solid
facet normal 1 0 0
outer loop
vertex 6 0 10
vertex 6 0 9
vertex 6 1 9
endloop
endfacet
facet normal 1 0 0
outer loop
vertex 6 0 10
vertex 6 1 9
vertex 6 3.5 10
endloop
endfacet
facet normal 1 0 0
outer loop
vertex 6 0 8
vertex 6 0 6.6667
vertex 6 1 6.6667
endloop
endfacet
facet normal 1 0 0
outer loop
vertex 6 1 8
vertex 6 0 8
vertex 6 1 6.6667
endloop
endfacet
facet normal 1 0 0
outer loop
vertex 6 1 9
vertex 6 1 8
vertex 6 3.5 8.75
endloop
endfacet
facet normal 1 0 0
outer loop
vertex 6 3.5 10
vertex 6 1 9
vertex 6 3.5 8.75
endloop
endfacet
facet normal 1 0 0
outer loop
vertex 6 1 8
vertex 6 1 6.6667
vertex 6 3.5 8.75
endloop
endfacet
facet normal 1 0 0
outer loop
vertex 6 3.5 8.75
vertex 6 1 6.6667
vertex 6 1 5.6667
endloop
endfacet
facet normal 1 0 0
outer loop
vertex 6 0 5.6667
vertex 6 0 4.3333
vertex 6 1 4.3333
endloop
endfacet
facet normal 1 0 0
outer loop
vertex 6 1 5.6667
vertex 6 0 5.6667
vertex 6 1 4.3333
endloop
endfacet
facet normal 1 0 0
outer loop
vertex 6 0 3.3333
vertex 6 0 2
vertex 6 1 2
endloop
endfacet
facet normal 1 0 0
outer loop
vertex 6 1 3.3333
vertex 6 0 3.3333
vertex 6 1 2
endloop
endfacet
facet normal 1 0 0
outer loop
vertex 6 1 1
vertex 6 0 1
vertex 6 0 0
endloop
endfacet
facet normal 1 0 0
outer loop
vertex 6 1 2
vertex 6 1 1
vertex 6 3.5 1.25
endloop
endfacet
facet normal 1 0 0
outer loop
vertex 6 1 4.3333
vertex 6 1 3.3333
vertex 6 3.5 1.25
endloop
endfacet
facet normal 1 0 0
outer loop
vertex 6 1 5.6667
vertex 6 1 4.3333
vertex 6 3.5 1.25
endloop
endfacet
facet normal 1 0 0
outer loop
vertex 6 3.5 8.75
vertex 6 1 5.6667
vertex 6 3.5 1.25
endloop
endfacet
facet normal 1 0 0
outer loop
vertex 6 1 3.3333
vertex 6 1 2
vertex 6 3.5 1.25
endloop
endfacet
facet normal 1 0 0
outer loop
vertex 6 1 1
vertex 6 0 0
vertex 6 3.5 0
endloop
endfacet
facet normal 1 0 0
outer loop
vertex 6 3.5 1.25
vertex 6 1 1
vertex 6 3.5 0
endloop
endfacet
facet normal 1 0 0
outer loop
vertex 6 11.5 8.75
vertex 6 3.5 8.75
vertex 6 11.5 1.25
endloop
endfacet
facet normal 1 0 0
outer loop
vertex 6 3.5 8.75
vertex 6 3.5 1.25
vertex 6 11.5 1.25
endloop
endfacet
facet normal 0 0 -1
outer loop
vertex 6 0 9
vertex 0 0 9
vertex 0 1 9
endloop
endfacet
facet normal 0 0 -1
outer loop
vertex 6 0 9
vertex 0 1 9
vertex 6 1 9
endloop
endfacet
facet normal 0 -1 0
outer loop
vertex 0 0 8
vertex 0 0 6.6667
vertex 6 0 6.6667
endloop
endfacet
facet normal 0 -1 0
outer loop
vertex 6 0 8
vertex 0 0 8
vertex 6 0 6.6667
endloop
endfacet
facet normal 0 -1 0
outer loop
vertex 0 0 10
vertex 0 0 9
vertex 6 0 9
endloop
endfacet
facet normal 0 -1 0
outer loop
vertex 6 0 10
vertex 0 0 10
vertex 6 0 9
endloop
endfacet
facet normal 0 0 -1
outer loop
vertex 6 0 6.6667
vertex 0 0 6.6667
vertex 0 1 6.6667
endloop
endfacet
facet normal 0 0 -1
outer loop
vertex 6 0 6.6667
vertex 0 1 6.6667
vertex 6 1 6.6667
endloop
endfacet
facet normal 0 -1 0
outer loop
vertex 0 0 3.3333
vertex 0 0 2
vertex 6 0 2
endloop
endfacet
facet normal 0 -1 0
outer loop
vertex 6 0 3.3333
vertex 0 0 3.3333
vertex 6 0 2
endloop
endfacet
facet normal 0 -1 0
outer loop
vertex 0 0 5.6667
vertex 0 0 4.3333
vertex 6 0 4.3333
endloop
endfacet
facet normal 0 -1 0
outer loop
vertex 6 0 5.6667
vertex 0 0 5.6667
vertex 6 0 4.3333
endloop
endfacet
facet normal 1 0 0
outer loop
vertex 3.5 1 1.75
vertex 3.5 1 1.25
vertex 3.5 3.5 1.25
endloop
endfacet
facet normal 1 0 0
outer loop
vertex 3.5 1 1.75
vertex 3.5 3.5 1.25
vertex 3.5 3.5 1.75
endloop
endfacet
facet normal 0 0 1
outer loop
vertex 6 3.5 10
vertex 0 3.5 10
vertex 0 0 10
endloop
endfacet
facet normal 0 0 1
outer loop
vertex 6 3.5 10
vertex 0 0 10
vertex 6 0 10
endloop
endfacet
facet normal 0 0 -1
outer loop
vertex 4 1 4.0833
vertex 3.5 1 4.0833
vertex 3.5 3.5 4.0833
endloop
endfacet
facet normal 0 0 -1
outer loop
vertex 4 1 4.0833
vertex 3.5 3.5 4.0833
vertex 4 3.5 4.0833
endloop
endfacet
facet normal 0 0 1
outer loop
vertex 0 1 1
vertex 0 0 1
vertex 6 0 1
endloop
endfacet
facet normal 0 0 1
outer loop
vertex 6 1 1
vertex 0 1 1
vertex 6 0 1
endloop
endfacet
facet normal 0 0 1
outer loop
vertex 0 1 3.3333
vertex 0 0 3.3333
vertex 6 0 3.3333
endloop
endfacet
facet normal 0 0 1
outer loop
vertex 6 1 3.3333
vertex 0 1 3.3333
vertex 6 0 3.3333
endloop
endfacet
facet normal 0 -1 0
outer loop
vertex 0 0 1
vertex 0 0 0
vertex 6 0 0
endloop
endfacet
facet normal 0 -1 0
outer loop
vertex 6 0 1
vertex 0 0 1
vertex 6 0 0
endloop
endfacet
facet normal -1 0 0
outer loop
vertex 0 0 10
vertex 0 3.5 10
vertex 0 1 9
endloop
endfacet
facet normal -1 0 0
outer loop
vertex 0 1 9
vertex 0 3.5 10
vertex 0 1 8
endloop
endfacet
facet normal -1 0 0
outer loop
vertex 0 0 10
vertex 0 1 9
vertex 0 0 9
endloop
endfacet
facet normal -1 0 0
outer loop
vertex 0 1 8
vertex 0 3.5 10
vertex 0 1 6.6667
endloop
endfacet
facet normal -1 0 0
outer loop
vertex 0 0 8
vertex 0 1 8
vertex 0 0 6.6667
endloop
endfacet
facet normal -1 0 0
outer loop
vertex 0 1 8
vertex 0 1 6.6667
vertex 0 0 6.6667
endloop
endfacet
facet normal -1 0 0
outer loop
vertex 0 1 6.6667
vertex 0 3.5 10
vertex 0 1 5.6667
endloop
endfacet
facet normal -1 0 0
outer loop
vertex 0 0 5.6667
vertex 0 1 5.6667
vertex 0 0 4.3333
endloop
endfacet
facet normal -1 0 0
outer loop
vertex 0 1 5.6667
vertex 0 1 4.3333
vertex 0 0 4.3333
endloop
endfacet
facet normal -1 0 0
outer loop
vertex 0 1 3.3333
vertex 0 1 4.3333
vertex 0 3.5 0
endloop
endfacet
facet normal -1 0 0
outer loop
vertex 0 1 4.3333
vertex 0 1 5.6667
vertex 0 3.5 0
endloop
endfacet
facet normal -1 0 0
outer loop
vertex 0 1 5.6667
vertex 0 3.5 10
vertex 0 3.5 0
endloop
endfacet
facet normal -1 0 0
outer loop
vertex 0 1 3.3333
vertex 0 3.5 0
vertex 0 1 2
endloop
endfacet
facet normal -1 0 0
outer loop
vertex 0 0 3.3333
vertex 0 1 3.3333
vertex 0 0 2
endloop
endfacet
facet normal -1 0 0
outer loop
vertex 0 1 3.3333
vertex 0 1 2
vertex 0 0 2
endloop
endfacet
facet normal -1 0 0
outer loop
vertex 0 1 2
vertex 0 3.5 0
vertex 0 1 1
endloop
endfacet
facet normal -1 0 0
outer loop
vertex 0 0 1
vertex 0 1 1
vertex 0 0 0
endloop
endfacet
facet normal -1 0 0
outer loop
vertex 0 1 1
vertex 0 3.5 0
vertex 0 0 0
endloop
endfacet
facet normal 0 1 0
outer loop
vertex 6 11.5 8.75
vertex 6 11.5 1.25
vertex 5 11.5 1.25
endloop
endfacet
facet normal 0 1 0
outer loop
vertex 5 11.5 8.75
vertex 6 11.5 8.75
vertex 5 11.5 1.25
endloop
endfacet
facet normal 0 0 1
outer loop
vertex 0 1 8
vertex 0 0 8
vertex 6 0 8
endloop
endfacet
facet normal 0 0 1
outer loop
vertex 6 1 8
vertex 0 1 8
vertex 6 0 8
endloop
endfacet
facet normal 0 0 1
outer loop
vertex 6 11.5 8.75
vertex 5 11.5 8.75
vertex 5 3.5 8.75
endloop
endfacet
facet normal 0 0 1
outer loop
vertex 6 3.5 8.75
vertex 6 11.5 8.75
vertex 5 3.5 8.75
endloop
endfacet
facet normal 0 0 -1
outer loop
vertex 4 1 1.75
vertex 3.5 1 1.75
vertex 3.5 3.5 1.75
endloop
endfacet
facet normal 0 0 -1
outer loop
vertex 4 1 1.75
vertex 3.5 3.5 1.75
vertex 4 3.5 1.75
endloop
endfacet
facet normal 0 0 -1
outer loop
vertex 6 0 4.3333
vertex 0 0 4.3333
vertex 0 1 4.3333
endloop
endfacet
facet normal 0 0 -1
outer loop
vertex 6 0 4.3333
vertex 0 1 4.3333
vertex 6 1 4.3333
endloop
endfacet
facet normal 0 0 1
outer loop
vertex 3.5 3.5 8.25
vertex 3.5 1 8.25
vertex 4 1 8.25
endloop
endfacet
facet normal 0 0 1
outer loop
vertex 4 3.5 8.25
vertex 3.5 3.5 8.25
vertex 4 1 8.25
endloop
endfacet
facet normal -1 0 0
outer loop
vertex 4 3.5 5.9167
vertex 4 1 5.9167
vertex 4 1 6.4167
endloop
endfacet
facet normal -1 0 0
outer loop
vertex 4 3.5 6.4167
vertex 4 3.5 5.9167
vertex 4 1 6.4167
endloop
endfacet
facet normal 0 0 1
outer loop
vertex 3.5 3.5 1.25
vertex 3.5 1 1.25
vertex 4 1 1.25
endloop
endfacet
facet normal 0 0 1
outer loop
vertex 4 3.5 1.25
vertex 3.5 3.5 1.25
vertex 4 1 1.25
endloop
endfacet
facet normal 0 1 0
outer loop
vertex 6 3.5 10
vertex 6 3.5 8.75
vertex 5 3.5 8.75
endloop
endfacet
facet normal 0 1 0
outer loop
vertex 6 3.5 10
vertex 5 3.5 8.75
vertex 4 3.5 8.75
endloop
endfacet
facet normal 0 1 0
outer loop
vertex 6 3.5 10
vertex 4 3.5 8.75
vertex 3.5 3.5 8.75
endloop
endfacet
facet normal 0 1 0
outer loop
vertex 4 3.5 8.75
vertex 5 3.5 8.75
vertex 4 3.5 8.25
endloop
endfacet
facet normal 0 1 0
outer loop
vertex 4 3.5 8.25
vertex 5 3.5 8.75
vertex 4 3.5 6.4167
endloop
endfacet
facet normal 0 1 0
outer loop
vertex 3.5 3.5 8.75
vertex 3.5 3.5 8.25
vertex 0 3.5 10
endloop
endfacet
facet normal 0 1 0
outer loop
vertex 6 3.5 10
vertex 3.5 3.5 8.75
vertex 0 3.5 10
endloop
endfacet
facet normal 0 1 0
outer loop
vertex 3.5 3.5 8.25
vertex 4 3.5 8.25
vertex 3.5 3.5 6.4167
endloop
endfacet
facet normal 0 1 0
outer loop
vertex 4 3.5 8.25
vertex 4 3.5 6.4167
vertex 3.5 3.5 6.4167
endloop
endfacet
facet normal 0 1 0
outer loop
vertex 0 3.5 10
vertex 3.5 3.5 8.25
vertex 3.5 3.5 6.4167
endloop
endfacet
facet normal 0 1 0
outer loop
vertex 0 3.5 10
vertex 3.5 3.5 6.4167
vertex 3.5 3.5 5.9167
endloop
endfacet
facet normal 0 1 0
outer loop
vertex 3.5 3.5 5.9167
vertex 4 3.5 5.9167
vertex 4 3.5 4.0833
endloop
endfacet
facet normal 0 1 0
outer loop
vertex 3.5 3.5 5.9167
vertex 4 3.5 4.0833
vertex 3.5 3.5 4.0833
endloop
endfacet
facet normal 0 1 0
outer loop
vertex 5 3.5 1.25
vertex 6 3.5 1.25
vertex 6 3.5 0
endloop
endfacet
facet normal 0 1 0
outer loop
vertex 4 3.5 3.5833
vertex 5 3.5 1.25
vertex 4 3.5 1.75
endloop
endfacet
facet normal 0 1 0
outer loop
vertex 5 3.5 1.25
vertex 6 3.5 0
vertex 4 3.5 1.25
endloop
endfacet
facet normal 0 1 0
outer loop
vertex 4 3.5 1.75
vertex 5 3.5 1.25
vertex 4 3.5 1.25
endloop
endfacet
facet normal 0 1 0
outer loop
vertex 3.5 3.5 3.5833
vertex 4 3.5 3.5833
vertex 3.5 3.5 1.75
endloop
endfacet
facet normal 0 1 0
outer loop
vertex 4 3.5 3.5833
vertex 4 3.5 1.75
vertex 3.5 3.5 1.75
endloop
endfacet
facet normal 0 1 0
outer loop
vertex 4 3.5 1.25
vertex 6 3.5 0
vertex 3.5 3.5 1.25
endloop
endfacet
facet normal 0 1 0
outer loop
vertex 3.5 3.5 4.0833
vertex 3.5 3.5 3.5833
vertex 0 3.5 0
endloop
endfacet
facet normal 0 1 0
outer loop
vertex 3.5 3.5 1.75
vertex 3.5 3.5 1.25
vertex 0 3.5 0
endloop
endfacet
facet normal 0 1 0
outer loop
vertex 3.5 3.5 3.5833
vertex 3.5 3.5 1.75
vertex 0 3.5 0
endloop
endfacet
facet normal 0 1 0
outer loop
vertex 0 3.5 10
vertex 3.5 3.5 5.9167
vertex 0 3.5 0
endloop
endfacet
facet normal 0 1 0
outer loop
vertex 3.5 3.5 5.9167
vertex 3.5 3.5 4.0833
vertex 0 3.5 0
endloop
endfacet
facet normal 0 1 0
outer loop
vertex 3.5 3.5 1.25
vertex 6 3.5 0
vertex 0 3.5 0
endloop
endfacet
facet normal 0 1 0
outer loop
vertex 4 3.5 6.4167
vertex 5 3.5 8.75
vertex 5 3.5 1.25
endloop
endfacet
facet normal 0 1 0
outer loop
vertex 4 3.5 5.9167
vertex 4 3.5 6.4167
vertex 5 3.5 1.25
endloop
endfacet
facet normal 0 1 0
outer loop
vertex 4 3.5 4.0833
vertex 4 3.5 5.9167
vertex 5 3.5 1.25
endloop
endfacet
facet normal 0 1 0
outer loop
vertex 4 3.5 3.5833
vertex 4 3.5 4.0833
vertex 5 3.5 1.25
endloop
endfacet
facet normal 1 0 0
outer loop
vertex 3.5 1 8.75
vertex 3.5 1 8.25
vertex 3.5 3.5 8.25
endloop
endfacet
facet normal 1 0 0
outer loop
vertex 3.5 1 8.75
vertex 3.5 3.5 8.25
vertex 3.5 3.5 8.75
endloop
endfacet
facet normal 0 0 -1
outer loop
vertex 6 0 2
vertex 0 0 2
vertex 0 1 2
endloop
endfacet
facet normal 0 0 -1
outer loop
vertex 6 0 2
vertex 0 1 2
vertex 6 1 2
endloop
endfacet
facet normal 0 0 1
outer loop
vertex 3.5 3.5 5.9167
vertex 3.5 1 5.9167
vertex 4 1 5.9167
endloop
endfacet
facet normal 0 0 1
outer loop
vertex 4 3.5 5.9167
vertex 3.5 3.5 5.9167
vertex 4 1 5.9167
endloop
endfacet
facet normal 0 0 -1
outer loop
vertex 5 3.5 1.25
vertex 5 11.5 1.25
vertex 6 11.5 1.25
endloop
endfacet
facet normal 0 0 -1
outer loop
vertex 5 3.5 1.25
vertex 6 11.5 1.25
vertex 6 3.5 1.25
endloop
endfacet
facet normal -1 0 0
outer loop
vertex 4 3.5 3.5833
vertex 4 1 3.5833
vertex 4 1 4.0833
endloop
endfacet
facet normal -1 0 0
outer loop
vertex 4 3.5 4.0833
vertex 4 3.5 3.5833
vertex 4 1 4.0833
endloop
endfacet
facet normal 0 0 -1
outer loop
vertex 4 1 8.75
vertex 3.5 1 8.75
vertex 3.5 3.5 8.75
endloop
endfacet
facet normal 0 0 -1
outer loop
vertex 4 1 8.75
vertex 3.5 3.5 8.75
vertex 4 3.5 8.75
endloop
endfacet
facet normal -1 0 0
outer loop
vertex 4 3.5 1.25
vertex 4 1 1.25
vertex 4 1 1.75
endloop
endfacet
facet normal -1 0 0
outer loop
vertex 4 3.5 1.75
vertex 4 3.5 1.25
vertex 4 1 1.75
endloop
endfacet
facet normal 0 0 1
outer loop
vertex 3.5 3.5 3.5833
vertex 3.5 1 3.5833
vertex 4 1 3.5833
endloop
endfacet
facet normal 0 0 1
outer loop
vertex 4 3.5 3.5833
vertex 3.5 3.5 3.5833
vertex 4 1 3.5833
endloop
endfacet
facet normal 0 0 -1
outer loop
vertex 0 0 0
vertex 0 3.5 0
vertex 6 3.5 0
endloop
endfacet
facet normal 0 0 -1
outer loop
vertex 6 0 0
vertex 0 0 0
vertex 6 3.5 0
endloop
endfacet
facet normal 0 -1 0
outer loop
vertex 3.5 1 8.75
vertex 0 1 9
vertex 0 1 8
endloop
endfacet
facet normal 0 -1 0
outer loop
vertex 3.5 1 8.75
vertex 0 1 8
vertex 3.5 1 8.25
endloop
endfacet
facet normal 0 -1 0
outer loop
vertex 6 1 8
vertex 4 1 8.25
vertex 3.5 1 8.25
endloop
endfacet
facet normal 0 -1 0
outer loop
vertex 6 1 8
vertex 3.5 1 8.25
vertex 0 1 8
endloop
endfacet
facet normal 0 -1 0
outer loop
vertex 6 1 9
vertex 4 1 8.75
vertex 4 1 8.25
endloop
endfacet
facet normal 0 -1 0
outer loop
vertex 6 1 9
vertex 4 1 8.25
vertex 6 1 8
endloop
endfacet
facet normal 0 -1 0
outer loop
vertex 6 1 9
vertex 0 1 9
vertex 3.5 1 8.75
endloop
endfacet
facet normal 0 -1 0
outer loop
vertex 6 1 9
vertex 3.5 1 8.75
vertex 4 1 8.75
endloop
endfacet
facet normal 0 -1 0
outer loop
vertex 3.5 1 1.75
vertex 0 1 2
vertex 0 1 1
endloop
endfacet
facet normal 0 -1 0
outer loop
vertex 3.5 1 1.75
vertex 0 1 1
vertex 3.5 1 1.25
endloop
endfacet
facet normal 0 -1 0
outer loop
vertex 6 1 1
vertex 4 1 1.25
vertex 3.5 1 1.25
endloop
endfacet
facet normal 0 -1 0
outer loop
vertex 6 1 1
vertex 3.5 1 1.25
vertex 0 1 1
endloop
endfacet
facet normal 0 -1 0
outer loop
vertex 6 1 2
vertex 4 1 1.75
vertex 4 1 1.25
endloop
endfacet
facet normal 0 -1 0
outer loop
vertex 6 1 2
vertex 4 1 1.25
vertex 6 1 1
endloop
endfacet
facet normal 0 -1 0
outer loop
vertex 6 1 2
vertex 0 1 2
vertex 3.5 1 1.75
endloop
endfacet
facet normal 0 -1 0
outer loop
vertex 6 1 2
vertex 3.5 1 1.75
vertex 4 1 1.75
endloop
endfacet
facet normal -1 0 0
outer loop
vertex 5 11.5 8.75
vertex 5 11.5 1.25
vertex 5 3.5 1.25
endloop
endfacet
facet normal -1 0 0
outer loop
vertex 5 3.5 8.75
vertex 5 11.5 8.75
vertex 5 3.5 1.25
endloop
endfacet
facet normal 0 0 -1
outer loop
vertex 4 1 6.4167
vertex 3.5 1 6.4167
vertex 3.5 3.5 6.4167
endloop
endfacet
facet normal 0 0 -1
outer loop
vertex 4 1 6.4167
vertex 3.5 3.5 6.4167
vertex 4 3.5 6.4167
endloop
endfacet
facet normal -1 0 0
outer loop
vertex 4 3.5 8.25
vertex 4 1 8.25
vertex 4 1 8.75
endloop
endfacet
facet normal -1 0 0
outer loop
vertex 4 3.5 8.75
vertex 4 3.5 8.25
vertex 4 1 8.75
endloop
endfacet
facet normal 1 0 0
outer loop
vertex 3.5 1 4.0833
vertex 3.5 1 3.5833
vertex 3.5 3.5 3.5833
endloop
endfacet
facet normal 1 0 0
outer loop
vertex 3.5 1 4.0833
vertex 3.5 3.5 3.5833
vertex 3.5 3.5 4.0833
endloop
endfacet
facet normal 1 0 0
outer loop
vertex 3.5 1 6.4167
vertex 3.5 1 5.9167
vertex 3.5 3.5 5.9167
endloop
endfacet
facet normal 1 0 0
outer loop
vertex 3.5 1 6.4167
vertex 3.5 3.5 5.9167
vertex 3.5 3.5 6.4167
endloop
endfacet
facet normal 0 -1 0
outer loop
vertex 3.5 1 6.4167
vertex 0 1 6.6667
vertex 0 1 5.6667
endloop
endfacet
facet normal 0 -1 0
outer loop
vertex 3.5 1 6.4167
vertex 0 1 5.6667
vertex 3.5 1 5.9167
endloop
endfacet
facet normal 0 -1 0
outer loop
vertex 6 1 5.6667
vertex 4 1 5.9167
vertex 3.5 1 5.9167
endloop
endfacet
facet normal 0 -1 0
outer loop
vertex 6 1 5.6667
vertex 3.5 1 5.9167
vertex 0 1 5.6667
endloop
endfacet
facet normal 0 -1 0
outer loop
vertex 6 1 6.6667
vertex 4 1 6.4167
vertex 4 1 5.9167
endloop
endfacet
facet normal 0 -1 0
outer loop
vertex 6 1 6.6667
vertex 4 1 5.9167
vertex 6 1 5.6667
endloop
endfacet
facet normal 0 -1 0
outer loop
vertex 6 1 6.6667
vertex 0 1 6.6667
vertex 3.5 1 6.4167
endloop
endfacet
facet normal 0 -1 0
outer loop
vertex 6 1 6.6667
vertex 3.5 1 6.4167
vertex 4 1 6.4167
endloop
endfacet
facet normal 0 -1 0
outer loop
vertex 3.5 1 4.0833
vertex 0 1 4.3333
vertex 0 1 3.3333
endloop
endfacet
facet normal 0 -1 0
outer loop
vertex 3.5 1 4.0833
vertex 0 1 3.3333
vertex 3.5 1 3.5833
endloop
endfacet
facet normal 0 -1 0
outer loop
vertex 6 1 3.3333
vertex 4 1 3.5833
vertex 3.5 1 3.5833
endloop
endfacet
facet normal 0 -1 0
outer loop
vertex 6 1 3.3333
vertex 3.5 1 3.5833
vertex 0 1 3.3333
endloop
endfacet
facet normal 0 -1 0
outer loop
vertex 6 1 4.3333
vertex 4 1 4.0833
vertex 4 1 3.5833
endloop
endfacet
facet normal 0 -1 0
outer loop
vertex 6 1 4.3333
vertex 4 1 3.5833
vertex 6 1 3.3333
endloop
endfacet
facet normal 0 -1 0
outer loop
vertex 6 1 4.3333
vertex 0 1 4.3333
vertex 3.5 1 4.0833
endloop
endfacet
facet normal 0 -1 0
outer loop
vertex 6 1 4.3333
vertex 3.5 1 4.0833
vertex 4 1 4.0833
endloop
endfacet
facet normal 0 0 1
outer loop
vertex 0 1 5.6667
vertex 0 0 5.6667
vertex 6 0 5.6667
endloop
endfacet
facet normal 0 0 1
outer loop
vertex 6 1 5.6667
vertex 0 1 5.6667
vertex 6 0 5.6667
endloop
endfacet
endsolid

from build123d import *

# Parameters (mm, degrees)
F1_DEPTH = 10
F2_W     = 8
F2_H     = 1.25
F3_DEPTH = 25
F4_W     = 0.5
F4_H     = 0.5
F5_DEPTH = 25
F6_W     = 6
F6_H     = 1
F7_DEPTH = 1


with BuildPart() as f1:
    # F0 (on Top) → F1 (new body)
    with BuildSketch(Plane.XY):
        Polygon((0, 3.5), (0, 0), (6, 0), (6, 11.5), (5, 11.5), (5, 3.5), align=None)
    extrude(amount=F1_DEPTH)

    # F2 (on face) → F3 (cut)
    with BuildSketch(Plane(origin=(5, 0, 0), x_dir=(0, -1, 0), z_dir=(-1, 0, 0))):
        with Locations((-7.5, 0.625)):
            Rectangle(F2_W, F2_H)
        with Locations((-7.5, 9.375)):
            Rectangle(F2_W, F2_H)
    extrude(amount=-F3_DEPTH, mode=Mode.SUBTRACT)

    # F4 (on face) → F5 (cut)
    with BuildSketch(Plane.XZ):
        with Locations((3.75, 8.5)):
            Rectangle(F4_W, F4_H)
        with Locations((3.75, 1.5)):
            Rectangle(F4_W, F4_H)
        with Locations((3.75, 6.166667)):
            Rectangle(F4_W, F4_H)
        with Locations((3.75, 3.833333)):
            Rectangle(F4_W, F4_H)
    extrude(amount=-F5_DEPTH, mode=Mode.SUBTRACT)

    # F6 (on face) → F7 (cut)
    with BuildSketch(Plane.XZ):
        with Locations((3, 8.5)):
            Rectangle(F6_W, F6_H)
        with Locations((3, 6.166667)):
            Rectangle(F6_W, F6_H)
        with Locations((3, 3.833333)):
            Rectangle(F6_W, F6_H)
        with Locations((3, 1.5)):
            Rectangle(F6_W, F6_H)
    extrude(amount=-F7_DEPTH, mode=Mode.SUBTRACT)


solid = f1.part
